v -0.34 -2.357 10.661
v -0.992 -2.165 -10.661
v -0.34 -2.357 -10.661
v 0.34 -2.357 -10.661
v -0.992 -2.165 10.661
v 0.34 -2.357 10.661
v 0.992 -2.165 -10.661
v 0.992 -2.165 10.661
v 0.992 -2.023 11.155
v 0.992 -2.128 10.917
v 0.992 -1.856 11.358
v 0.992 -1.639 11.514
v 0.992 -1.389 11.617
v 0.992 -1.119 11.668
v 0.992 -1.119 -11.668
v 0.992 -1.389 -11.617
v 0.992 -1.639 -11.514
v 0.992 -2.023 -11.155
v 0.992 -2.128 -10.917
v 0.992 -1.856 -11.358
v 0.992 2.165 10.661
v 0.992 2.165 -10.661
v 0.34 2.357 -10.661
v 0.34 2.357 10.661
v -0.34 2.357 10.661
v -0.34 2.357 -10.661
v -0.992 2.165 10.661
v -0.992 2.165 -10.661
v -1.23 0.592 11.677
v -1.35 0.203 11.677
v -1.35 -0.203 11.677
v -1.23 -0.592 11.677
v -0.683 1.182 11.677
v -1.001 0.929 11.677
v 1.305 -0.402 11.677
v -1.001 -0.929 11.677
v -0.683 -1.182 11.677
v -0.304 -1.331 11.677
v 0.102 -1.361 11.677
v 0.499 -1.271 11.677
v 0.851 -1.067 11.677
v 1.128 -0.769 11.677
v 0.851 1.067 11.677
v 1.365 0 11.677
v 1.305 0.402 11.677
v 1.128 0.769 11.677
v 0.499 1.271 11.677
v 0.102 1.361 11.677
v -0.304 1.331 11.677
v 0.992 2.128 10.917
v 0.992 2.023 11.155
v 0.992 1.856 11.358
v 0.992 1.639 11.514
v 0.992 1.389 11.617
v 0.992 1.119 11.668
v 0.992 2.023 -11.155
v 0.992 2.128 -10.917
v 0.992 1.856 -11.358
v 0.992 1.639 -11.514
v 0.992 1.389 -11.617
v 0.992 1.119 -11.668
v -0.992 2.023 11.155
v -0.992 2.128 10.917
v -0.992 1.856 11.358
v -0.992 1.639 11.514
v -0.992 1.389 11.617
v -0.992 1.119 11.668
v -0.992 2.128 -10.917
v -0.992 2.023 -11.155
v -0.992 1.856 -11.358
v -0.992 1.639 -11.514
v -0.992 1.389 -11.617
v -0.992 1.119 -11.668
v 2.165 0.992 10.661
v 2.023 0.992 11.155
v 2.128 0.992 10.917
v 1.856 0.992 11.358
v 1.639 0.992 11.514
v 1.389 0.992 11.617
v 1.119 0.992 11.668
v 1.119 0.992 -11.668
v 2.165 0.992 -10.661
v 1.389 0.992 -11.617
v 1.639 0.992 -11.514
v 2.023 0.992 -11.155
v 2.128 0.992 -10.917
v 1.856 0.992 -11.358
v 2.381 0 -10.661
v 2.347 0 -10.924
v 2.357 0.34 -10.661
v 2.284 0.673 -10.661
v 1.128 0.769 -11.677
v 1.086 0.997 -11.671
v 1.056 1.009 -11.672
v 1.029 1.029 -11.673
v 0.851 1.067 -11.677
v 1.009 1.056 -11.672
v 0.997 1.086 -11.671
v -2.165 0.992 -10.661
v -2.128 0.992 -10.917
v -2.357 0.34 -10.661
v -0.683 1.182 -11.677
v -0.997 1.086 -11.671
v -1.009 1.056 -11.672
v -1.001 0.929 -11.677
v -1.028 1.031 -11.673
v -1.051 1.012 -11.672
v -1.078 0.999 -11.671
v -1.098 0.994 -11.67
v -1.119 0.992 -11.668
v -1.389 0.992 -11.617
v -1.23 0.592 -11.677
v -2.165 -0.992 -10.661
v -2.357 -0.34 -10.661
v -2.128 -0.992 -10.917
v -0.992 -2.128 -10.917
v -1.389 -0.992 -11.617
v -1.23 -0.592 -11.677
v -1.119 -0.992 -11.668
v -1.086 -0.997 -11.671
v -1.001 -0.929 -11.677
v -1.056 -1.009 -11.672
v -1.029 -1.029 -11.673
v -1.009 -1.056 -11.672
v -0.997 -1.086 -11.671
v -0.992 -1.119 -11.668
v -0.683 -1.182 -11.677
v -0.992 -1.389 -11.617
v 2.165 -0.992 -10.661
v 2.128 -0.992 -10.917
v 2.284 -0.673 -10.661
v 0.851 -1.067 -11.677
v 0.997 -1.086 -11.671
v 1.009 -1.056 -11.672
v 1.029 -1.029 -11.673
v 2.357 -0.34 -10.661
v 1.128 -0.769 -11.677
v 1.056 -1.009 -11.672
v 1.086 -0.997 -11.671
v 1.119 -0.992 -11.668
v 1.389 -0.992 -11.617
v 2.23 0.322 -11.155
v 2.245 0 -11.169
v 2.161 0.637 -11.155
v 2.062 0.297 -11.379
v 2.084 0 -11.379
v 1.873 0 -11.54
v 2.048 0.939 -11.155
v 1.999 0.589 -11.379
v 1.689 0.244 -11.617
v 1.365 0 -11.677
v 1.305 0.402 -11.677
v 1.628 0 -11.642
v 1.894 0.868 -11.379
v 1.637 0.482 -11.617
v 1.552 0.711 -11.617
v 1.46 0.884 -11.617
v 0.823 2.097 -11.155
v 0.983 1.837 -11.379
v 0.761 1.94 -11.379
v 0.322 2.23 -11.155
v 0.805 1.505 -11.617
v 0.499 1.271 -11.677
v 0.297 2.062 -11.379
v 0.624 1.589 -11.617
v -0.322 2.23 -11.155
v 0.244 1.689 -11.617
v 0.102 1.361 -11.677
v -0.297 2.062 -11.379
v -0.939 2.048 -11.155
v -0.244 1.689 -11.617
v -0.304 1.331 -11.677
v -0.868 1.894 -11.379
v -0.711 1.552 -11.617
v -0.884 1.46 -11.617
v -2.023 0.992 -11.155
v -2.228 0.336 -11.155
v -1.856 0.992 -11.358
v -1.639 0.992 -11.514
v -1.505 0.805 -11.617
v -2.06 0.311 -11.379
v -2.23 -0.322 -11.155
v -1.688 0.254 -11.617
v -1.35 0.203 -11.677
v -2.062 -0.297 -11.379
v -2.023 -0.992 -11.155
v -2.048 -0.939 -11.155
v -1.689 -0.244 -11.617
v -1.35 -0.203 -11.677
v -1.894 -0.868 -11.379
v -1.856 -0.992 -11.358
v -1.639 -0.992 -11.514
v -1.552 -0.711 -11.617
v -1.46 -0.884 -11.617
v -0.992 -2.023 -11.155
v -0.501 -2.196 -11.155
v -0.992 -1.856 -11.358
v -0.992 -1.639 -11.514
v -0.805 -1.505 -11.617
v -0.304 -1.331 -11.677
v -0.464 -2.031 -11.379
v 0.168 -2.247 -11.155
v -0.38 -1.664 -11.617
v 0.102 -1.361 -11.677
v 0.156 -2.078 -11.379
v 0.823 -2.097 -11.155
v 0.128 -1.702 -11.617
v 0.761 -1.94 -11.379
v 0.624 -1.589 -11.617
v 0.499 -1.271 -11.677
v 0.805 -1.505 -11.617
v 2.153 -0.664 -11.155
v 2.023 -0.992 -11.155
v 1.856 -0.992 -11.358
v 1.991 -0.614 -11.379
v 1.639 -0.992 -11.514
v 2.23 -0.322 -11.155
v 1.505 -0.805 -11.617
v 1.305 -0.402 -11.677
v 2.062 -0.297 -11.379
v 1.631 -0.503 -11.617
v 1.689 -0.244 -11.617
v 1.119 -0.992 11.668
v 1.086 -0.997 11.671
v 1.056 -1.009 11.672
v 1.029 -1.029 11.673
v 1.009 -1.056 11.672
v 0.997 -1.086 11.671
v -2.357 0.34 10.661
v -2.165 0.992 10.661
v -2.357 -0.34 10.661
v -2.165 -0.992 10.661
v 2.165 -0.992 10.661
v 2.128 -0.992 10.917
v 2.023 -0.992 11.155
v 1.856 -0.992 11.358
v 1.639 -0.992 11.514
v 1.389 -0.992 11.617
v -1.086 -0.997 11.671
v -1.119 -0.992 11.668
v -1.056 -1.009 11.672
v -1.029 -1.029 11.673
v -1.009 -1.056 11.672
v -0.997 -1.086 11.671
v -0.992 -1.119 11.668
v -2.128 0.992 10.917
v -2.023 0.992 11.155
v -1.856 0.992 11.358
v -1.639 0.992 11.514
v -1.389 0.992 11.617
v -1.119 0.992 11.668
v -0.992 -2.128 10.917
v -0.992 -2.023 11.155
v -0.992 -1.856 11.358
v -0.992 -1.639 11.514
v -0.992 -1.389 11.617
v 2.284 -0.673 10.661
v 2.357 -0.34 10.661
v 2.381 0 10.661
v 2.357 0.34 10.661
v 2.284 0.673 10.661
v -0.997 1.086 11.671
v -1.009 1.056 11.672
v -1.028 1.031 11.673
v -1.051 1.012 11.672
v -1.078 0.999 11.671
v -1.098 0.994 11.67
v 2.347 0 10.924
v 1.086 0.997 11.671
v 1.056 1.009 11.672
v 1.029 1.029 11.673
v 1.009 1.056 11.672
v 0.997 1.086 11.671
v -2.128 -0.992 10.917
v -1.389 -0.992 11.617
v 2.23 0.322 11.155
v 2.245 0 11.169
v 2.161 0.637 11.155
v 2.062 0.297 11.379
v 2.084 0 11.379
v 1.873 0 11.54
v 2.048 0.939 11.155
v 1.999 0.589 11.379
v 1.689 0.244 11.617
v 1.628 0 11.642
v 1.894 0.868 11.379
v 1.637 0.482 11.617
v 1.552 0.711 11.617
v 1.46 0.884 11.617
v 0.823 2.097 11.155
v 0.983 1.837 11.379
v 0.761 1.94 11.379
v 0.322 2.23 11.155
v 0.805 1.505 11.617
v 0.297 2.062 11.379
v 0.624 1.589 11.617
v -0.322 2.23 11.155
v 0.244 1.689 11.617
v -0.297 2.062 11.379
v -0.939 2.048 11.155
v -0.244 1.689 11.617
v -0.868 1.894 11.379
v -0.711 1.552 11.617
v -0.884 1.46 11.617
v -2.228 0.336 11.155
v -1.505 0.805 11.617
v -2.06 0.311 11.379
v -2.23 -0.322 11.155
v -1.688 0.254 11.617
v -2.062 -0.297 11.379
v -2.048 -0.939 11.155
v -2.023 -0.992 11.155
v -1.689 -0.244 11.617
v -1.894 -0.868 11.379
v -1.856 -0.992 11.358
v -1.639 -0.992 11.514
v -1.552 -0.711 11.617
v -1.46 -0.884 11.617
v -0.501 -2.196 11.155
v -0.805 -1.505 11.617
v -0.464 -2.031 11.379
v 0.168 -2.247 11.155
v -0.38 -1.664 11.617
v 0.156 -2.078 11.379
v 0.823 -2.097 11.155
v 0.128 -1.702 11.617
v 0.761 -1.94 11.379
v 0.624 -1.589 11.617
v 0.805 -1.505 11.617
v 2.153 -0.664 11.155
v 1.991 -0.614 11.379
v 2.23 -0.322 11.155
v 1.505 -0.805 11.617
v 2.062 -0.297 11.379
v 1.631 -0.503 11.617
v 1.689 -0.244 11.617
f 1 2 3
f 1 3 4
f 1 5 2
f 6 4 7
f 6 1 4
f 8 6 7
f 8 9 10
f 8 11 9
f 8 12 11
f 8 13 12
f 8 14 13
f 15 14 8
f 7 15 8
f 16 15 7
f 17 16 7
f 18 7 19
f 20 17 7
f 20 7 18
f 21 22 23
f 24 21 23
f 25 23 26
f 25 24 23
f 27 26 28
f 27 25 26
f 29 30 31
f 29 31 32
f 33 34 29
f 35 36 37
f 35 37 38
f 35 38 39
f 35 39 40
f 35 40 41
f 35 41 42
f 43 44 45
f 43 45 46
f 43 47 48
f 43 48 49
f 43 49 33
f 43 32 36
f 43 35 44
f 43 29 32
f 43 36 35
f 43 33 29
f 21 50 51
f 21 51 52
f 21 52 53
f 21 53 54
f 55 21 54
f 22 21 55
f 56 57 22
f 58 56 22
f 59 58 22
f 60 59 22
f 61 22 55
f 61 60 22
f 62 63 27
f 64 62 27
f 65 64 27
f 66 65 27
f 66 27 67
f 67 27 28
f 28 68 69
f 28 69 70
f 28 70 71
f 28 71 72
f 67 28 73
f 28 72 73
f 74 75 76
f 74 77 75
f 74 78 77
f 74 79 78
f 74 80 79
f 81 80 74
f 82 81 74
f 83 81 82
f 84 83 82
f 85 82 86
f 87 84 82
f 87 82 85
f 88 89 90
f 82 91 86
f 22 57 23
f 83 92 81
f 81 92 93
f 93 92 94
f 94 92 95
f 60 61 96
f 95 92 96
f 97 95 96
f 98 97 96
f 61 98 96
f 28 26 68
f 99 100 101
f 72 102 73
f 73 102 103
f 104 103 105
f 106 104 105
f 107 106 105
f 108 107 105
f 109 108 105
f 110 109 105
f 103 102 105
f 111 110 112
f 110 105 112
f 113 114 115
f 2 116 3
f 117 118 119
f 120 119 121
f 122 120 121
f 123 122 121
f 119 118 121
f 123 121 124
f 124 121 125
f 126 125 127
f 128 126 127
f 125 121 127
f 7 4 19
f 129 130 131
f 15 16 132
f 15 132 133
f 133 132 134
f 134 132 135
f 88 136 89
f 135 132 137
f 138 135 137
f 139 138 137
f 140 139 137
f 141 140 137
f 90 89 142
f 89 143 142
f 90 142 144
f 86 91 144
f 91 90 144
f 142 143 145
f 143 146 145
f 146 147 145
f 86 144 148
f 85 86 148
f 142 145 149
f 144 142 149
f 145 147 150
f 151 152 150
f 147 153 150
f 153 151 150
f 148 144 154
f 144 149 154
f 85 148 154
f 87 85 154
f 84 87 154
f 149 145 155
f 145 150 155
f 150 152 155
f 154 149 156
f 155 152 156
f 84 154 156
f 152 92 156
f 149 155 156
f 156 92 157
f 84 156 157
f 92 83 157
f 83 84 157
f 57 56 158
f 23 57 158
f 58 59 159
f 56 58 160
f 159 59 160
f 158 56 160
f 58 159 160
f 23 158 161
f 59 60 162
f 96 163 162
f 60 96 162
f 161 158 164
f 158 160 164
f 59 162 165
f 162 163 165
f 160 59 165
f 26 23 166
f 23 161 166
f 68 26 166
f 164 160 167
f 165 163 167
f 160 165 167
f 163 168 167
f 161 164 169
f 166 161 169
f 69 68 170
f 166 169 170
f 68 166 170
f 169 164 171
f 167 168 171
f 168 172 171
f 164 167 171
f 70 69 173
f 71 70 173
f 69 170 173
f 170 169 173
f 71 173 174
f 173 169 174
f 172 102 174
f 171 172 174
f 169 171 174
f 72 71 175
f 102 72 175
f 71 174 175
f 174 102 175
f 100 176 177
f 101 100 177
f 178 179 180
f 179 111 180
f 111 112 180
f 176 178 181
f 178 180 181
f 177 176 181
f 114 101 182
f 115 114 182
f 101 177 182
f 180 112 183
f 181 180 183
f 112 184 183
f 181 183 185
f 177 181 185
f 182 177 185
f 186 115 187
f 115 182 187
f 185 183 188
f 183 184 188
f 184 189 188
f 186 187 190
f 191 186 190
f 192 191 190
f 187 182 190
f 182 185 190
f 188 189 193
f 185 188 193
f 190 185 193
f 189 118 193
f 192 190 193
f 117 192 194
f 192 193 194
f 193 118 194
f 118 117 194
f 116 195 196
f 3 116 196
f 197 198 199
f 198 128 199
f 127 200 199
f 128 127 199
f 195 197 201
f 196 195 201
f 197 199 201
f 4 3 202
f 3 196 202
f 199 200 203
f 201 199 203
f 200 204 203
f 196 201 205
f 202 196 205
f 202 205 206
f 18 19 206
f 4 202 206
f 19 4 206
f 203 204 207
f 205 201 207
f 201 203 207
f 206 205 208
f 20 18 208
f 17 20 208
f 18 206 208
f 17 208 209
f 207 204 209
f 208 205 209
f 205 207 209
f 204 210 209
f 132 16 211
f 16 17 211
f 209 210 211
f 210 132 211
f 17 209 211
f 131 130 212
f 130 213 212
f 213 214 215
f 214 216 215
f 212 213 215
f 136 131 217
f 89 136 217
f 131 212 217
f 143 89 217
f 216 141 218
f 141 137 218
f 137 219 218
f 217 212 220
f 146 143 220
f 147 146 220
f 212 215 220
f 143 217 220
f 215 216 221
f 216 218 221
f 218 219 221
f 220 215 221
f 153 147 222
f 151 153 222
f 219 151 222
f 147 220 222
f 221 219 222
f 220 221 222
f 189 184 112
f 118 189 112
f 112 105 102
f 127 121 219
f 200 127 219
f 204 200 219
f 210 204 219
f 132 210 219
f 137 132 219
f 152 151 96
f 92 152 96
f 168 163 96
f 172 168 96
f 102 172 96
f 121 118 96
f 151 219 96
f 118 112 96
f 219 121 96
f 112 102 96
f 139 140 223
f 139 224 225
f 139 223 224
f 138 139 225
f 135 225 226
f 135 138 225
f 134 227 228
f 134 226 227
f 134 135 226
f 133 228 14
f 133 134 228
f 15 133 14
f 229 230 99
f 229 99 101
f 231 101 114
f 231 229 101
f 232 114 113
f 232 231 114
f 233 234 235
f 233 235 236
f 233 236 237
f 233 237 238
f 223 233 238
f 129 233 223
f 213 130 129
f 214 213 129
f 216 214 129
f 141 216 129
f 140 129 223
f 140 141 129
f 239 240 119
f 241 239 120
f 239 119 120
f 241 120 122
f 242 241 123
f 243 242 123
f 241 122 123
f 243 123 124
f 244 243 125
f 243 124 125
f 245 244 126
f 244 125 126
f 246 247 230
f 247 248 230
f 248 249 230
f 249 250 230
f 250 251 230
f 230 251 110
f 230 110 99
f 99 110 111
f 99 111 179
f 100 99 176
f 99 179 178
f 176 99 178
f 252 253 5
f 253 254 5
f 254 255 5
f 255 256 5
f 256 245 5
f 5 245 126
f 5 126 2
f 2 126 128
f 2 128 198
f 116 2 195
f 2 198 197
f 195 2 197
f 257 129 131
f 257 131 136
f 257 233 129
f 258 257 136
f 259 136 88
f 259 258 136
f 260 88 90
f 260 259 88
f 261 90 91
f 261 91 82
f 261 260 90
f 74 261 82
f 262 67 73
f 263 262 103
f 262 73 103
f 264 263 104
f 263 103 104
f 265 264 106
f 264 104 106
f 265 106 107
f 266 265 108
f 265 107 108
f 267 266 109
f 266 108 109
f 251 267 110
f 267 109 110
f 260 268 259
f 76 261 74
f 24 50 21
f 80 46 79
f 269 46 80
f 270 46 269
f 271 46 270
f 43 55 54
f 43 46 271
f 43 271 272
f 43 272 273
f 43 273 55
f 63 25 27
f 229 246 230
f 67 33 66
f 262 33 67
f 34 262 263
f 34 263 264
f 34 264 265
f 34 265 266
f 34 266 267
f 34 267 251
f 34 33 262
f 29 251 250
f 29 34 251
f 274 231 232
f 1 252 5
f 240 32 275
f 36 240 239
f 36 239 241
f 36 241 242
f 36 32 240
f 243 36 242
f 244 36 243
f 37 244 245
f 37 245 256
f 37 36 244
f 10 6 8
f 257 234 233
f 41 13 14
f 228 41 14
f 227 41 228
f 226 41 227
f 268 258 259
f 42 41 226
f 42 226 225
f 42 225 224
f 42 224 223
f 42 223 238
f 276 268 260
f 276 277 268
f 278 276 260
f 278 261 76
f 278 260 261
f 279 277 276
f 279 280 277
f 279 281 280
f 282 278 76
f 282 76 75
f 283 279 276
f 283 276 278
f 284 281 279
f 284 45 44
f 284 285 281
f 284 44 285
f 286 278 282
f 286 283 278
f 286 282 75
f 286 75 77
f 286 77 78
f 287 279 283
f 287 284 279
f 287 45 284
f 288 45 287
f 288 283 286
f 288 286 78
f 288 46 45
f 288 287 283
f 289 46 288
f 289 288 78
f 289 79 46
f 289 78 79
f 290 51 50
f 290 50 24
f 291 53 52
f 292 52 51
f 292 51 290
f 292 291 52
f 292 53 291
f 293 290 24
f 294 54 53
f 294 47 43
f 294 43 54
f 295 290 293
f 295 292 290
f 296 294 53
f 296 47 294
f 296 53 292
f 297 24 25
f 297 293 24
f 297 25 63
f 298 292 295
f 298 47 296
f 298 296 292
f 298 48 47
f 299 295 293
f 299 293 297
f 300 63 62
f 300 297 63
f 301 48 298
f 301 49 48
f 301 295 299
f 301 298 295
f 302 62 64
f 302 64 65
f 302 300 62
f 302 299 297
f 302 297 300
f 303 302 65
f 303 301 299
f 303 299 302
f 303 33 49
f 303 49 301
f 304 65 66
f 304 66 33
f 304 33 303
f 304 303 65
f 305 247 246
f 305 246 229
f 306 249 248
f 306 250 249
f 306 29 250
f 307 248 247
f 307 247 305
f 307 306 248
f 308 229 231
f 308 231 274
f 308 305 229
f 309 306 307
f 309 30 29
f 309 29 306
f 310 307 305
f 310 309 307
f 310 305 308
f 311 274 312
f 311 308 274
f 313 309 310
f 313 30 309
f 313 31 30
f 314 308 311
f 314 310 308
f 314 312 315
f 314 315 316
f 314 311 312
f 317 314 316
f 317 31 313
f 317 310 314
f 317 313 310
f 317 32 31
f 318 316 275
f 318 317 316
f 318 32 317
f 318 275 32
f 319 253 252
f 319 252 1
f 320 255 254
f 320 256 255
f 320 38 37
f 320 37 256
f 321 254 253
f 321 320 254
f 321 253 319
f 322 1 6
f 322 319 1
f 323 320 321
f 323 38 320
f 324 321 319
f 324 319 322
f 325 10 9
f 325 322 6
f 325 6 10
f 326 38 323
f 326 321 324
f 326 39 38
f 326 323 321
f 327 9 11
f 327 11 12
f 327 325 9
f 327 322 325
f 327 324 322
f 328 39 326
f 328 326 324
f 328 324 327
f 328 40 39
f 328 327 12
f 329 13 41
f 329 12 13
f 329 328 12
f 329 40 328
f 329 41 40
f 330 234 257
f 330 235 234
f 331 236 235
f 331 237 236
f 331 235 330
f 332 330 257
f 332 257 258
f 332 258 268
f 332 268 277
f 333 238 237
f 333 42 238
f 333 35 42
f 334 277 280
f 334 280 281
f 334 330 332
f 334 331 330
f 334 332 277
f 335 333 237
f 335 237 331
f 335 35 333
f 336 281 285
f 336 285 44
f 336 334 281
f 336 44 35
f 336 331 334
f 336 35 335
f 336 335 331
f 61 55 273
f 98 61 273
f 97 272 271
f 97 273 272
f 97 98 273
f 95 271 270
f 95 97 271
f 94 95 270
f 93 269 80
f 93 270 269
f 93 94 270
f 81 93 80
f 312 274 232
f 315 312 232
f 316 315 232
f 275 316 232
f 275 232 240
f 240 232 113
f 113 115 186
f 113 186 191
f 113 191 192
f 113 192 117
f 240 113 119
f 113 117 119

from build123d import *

# Parameters (mm, degrees)
SKETCH1_R           = 2.38125
EXTRUDE1_DEPTH      = 11.6765625
FILLET1_R           = 1.016
EXTRUDE2_DEPTH      = 13.152481882
EXTRUDE2_DEPTH_BACK = 13.152481882


with BuildPart() as part:
    # Sketch1 → Extrude1 (new, symmetric)
    with BuildSketch(Plane.XY):
        Circle(SKETCH1_R)
    extrude(amount=EXTRUDE1_DEPTH, both=True)

    # Fillet1
    fillet1_edges = [part.edges().sort_by_distance(p)[0] for p in [
        (-2.38125, 0, -11.6765625),
        (-2.38125, 0, 11.6765625),
    ]]
    fillet(fillet1_edges, radius=FILLET1_R)

    # Sketch3 → Extrude2 (cut, two sides: drawn at the far end of the back side and taken through both)
    with BuildSketch(Plane.XY.offset(-EXTRUDE2_DEPTH_BACK)):
        with BuildLine():
            Line((-0.9921875, 2.16469756), (-0.9921875, 1.1191875))
            ThreePointArc((-0.9921875, 1.1191875), (-1.029384939, 1.029384939), (-1.1191875, 0.9921875))
            Line((-1.1191875, 0.9921875), (-2.16469756, 0.9921875))
            ThreePointArc((-2.16469756, 0.9921875), (-1.683798023, 1.683798023), (-0.9921875, 2.16469756))
        make_face()
        with BuildLine():
            Line((-2.16469756, -0.9921875), (-1.1191875, -0.9921875))
            ThreePointArc((-1.1191875, -0.9921875), (-1.029384939, -1.029384939), (-0.9921875, -1.1191875))
            Line((-0.9921875, -1.1191875), (-0.9921875, -2.16469756))
            ThreePointArc((-0.9921875, -2.16469756), (-1.683798023, -1.683798023), (-2.16469756, -0.9921875))
        make_face()
        with BuildLine():
            Line((0.9921875, 2.16469756), (0.9921875, 1.1191875))
            ThreePointArc((0.9921875, 1.1191875), (1.029384939, 1.029384939), (1.1191875, 0.9921875))
            Line((1.1191875, 0.9921875), (2.16469756, 0.9921875))
            ThreePointArc((2.16469756, 0.9921875), (1.683798023, 1.683798023), (0.9921875, 2.16469756))
        make_face()
        with BuildLine():
            Line((0.9921875, -1.1191875), (0.9921875, -2.16469756))
            ThreePointArc((0.9921875, -2.16469756), (1.683798023, -1.683798023), (2.16469756, -0.9921875))
            Line((2.16469756, -0.9921875), (1.1191875, -0.9921875))
            ThreePointArc((1.1191875, -0.9921875), (1.029384939, -1.029384939), (0.9921875, -1.1191875))
        make_face()
    extrude(amount=EXTRUDE2_DEPTH + EXTRUDE2_DEPTH_BACK, mode=Mode.SUBTRACT)


solid = part.part
